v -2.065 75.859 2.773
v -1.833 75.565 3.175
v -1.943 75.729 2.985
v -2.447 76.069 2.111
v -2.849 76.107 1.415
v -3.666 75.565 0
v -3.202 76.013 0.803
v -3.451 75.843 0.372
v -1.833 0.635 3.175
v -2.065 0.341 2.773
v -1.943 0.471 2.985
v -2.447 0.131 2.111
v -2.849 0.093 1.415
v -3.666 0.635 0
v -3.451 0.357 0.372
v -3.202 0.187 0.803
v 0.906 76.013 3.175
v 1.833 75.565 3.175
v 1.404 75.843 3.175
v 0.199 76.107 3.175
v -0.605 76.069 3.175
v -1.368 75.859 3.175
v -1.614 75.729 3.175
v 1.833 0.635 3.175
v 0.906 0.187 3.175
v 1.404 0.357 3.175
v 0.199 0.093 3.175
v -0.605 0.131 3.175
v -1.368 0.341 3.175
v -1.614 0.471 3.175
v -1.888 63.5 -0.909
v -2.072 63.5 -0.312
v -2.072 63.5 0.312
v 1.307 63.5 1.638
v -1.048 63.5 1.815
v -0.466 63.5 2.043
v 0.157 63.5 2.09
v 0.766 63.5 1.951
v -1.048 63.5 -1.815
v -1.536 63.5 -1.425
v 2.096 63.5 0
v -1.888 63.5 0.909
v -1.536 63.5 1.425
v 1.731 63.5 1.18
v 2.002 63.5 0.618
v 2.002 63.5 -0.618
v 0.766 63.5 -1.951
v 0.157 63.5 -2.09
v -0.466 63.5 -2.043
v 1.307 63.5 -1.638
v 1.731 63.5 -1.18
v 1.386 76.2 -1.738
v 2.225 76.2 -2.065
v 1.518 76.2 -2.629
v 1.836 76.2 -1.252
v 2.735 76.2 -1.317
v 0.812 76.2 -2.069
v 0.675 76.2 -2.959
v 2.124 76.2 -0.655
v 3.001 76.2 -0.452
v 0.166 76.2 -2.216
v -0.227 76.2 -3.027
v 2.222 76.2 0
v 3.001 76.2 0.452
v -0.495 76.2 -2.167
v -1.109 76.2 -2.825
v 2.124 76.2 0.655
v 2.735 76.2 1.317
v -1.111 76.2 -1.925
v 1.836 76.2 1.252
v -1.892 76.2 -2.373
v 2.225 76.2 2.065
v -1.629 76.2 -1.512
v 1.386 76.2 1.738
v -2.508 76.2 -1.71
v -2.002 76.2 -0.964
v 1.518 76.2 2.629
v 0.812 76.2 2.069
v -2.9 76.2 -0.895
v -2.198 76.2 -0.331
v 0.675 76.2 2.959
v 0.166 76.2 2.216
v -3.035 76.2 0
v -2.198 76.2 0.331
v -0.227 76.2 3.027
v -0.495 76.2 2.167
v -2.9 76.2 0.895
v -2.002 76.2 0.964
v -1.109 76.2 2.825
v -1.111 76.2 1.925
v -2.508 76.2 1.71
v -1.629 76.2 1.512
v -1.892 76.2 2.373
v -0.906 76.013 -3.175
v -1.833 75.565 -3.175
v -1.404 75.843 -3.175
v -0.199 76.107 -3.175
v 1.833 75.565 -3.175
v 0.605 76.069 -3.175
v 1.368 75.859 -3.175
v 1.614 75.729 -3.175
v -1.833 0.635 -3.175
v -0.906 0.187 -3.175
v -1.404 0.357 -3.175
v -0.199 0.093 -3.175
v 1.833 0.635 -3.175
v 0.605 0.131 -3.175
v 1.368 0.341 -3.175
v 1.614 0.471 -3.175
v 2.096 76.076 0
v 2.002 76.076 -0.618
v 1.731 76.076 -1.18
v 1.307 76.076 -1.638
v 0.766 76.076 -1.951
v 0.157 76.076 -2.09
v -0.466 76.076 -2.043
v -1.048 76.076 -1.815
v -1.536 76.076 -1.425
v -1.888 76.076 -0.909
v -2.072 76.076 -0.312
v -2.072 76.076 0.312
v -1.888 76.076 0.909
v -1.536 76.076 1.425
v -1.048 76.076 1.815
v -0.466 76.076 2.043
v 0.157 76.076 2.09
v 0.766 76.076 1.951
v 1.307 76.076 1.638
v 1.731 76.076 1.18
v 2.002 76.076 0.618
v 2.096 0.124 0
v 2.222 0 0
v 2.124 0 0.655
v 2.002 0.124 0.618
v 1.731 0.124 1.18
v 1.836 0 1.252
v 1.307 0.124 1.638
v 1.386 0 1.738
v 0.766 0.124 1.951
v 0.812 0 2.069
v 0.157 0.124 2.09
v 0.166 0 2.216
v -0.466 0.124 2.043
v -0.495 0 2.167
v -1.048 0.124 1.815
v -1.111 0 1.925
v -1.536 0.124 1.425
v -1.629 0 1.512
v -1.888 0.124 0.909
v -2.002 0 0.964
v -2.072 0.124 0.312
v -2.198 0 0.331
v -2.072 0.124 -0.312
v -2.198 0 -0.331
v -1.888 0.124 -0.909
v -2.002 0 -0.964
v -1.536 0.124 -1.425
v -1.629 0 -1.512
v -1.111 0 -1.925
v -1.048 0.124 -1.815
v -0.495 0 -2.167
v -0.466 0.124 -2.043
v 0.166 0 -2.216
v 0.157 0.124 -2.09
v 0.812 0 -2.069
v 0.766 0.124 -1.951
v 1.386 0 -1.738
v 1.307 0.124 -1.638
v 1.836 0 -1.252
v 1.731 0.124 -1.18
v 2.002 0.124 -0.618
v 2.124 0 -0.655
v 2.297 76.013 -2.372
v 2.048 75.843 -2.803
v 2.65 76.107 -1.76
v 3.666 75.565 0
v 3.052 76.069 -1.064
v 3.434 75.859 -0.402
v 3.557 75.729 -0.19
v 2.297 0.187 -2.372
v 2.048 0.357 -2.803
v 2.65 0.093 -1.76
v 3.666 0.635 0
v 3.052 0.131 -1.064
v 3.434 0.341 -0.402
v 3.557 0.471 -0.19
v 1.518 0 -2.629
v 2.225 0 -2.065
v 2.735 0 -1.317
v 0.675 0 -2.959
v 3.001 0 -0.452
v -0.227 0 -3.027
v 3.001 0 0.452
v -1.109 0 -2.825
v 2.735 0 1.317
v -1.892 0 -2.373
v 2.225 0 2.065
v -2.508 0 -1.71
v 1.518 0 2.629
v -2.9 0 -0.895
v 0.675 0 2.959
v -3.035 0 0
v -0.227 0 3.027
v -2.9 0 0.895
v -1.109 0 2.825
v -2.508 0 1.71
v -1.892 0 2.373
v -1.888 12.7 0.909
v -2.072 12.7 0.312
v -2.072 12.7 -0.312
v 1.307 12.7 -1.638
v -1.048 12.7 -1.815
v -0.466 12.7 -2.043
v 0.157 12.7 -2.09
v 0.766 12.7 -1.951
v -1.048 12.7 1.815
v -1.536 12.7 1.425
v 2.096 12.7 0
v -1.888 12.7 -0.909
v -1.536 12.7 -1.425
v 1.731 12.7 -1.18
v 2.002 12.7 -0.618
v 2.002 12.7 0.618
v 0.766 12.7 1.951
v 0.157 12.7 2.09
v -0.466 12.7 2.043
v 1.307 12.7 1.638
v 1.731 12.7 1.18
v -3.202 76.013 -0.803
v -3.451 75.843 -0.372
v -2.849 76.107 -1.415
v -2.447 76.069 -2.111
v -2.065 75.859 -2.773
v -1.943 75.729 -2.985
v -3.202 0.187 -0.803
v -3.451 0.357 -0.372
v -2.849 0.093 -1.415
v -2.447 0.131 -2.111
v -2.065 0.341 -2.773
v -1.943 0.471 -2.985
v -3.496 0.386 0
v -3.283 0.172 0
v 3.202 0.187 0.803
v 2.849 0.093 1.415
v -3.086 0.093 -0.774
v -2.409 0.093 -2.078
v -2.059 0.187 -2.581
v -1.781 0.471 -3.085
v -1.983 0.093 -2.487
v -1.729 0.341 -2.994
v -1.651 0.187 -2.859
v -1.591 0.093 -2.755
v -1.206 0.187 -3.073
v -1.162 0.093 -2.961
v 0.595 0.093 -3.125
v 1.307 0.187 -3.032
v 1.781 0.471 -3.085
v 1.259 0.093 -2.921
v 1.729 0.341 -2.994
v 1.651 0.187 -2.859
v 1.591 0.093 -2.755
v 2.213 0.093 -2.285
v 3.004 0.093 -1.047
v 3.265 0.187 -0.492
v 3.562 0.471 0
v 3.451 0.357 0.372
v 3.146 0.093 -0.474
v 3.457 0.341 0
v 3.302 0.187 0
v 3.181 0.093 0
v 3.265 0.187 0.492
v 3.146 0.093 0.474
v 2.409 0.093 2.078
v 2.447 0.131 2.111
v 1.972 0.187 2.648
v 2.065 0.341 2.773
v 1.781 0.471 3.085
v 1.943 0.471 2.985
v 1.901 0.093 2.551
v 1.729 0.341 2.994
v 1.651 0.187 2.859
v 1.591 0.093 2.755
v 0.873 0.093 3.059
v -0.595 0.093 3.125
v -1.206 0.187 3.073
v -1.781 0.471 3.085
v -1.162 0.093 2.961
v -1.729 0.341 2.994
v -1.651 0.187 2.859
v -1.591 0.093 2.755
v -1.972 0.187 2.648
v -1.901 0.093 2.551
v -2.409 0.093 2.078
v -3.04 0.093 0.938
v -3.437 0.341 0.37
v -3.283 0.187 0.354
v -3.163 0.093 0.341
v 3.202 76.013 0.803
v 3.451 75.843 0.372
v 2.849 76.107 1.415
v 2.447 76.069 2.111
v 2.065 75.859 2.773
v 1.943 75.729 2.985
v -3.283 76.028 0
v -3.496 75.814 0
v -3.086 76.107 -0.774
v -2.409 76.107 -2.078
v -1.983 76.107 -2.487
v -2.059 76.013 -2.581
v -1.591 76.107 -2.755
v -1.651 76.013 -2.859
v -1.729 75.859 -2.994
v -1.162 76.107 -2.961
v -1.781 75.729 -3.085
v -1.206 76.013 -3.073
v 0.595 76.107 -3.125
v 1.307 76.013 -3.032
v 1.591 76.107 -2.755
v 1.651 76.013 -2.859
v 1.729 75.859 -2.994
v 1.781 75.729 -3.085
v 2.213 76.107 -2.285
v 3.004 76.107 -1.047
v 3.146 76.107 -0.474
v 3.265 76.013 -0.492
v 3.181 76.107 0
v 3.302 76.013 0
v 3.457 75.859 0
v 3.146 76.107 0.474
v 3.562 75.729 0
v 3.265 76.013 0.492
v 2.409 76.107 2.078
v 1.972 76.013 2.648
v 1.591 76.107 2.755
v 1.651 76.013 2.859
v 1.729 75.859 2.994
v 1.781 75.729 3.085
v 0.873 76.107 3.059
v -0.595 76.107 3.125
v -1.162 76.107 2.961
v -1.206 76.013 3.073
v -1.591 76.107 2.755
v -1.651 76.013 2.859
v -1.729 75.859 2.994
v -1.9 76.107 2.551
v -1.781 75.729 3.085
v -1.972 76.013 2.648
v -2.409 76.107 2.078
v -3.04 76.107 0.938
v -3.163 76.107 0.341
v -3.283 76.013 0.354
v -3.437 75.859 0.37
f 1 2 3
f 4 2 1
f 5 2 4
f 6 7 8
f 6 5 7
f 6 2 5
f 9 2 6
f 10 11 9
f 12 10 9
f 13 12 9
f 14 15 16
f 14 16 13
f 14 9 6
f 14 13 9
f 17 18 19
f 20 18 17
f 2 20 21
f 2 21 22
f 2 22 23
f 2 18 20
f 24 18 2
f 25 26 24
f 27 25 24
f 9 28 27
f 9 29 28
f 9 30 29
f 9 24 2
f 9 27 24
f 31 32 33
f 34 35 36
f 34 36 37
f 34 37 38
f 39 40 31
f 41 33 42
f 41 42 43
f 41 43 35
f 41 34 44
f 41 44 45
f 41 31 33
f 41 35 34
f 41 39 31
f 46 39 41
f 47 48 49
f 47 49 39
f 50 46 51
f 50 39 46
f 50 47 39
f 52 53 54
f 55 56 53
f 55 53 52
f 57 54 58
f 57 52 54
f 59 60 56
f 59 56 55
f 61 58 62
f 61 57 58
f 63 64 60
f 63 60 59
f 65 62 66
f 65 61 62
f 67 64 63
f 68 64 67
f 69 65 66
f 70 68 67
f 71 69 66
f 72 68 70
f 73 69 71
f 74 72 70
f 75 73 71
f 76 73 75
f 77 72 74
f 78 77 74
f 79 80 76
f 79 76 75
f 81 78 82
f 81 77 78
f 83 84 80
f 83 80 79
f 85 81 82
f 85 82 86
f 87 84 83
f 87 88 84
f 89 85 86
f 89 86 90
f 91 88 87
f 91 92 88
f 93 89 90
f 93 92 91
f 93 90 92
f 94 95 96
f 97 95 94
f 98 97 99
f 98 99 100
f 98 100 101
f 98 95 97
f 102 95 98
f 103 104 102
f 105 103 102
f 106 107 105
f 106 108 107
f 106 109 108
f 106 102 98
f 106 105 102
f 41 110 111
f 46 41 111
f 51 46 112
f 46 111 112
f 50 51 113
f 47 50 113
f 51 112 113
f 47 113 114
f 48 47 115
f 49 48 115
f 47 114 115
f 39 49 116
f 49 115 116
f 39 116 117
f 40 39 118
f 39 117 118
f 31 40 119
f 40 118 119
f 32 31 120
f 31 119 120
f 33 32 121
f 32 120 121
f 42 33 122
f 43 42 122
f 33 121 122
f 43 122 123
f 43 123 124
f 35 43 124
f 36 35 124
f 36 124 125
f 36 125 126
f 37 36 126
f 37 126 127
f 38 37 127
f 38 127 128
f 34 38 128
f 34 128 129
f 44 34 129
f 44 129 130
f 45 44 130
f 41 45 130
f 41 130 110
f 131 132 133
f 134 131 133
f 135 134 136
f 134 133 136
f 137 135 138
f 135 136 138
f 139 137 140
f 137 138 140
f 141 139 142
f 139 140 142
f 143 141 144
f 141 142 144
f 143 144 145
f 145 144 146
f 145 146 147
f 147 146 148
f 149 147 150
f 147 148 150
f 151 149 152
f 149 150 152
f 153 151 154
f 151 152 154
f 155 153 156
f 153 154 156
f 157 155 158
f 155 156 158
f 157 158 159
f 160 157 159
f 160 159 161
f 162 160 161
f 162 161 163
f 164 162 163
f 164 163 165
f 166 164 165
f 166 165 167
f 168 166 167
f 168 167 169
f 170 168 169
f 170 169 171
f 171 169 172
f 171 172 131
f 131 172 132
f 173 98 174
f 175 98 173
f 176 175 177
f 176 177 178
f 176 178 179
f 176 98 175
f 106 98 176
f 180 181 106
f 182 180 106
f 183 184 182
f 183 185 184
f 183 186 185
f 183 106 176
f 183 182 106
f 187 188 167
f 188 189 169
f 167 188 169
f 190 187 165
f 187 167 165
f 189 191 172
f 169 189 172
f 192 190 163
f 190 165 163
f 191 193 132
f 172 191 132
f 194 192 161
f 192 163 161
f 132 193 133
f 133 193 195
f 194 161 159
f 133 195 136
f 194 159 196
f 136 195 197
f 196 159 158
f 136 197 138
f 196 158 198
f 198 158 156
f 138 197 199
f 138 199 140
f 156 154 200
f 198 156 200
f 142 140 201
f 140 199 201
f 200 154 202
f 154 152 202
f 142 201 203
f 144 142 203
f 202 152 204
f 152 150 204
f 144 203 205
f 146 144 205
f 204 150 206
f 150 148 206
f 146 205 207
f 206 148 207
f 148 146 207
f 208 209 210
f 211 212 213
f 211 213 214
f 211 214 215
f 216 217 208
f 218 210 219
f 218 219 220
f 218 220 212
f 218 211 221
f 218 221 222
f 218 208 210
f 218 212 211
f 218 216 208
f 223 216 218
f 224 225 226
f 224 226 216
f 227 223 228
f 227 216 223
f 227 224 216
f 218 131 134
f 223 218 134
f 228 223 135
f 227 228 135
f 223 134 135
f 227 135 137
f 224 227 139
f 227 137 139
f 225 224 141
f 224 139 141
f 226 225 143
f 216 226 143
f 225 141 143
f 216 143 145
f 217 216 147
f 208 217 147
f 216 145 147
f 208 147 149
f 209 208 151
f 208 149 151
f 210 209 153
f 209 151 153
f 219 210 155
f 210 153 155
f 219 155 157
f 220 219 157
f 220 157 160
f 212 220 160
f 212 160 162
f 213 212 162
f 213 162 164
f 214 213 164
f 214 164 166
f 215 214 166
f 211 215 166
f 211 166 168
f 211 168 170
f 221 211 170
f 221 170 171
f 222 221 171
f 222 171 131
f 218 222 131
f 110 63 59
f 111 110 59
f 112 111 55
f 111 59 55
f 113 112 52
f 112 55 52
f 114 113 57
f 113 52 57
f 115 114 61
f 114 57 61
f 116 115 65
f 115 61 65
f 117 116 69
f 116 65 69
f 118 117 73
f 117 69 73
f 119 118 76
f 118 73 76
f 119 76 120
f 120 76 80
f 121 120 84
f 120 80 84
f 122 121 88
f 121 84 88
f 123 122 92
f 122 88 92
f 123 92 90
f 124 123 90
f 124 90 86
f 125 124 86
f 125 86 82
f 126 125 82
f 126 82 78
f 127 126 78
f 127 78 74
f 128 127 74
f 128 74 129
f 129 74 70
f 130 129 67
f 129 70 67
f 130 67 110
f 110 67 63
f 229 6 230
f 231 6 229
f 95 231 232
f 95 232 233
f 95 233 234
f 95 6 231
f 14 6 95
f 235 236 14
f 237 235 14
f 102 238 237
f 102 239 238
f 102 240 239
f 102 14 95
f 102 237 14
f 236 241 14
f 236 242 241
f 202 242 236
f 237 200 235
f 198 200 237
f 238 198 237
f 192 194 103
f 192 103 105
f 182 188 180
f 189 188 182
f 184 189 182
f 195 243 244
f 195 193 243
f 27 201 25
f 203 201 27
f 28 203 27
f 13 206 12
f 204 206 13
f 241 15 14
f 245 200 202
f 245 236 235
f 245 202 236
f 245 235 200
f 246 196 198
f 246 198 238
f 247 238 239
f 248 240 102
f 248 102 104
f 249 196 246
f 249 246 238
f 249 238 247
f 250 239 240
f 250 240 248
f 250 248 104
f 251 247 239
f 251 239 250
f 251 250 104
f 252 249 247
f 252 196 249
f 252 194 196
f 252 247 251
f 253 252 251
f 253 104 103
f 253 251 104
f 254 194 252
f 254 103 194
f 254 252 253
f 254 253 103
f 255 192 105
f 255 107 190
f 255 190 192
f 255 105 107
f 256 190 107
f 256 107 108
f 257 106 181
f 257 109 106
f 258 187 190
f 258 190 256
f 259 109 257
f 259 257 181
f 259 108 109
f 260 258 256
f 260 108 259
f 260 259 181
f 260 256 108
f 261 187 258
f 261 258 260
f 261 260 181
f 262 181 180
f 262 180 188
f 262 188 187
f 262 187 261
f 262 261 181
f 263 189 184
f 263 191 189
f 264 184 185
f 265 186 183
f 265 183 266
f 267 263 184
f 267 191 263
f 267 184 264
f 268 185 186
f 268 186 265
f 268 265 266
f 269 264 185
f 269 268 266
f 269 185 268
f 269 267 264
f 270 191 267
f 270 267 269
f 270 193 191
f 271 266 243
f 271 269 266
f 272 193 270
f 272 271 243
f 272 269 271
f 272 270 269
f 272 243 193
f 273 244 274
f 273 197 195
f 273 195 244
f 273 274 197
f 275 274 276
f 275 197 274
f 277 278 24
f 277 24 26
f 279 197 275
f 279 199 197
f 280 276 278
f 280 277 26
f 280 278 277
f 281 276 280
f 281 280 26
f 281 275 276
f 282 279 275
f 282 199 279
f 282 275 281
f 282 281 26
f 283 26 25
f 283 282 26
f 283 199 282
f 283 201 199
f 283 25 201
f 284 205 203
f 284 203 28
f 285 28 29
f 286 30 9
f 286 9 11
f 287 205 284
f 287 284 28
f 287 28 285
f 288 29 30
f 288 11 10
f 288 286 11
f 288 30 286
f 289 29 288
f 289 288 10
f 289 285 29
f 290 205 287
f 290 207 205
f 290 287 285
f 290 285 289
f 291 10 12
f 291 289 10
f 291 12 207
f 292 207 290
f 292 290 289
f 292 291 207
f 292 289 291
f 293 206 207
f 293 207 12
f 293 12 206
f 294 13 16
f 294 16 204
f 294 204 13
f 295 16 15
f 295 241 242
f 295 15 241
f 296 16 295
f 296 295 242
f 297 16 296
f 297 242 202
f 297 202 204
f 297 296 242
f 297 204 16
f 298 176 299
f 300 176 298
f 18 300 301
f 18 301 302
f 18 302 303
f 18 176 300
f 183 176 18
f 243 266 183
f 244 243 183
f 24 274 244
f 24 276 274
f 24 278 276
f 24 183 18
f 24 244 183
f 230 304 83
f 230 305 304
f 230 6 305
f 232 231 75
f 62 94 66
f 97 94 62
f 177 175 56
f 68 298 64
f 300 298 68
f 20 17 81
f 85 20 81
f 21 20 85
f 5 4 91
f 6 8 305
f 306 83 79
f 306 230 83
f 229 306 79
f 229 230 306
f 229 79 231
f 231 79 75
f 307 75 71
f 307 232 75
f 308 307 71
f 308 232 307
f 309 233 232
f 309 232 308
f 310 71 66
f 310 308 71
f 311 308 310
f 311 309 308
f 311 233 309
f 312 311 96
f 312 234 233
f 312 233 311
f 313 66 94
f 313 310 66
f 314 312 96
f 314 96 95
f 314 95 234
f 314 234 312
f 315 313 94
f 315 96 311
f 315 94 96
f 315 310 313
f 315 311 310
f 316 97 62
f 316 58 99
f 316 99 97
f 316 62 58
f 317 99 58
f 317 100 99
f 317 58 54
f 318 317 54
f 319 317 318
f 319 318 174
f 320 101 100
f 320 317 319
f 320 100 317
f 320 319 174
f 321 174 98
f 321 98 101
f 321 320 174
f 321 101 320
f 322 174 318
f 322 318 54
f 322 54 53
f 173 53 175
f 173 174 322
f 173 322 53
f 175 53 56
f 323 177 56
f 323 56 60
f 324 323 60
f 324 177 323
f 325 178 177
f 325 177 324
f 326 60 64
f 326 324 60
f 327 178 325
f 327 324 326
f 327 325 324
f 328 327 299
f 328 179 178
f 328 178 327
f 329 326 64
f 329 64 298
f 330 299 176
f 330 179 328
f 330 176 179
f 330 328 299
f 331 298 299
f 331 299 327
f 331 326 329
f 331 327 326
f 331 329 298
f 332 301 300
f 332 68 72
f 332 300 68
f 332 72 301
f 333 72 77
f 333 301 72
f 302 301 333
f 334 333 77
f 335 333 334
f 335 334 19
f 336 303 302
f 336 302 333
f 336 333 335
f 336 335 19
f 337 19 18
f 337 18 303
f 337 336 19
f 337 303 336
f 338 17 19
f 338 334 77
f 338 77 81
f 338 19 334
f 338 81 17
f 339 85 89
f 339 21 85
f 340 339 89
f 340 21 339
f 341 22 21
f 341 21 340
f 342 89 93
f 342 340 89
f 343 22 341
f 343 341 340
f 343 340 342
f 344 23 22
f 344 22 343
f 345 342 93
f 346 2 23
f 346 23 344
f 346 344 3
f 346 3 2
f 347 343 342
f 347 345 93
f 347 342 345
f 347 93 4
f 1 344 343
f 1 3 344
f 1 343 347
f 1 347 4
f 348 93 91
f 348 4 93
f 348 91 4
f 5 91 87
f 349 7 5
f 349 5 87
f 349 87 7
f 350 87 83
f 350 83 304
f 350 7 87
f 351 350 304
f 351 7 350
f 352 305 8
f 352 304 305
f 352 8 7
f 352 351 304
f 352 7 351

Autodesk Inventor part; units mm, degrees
ref_plane "YZ Plane" through (0, 0, 0) normal (1, 0, 0) x (0, 1, 0)
ref_plane "XZ Plane" through (0, 0, 0) normal (0, 1, 0) x (-1, 0, 0)
ref_plane "XY Plane" through (0, 0, 0) normal (0, 0, 1) x (1, 0, 0)
sketch "Sketch1" plane through (0, 0, 0) normal (0, 1, 0) x (-1, 0, 0)
  line L0 (-1.8331, -3.175) -> (-3.6662, 0)
  line L1 (-3.6662, 0) -> (-1.8331, 3.175)
  line L2 (-1.8331, 3.175) -> (1.8331, 3.175)
  line L3 (1.8331, 3.175) -> (3.6662, 0)
  line L4 (3.6662, 0) -> (1.8331, -3.175)
  line L5 (1.8331, -3.175) -> (-1.8331, -3.175)
  point P0 (0, 0)
  point P1 (0, 0)
  dimension "d0" = 6.35
extrude "Body" add sketch "Sketch1" along normal blind 76.2
sketch "Sketch2" plane through (0, 76.2, 0) normal (0, 1, 0) x (1, 0, 0)
  circle A0 centre (0, 0) radius 2.0955
  dimension "d3" = 4.191
extrude "Hole 2" cut sketch "Sketch2" against normal blind 12.7
sketch "Sketch3" plane through (0, 0, 0) normal (0, -1, 0) x (1, 0, 0)
  circle A0 centre (0, 0) radius 2.0955
  dimension "d6" = 4.191
extrude "Hole 1" cut sketch "Sketch3" against normal blind 12.7
chamfer "Hole 2 Chamfer 1" distance 0.127 distance2 0.1244 1 edges at (-2.0955, 76.2, 0) measured on face at (0.0842, 76.2, 2.8101)
chamfer "Hole 1 Chamfer 1" distance 0.127 distance2 0.1244 1 edges at (-2.0955, 0, 0) measured on face at (-0.0842, 0, 2.8101)
sketch "Sketch4" plane through (0, 0, 0) normal (0, 0, 1) x (1, 0, 0)
  line L0 (1.8331, 76.2) -> (-1.8331, 76.2) projected
  line L1 (0, 76.2) -> (-3.0353, 76.2)
  line L2 (-3.6662, 76.2) -> (-1.8331, 76.2) projected
  line L3 (-3.6662, 0) -> (-3.6662, 76.2) projected
  arc A0 (-3.0353, 76.2) -> (-3.6662, 75.565) centre (-2.2234, 74.7624) ccw
  line L4 (-3.6662, 75.565) -> (-6.3588, 78.1647)
  line L5 (-6.3588, 78.1647) -> (0, 76.2)
  line L6 (0, 76.2) -> (0, 129.864)
  point P0 (0, 0)
  dimension "d15" = 3.0353
  dimension "d16" = 1.651
  dimension "d17" = 0.635
revolve "Hole 2 Chamfer 2" cut sketch "Sketch4" angle 360 about axis through (0, 76.2, 0) along (0, 1, 0)
sketch "Sketch5" plane through (0, 0, 0) normal (0, 0, 1) x (1, 0, 0)
  line L0 (0, 0) -> (-3.0353, 0)
  line L1 (1.8331, 0) -> (-1.8331, 0) projected
  line L2 (-3.6662, 0) -> (-3.6662, 76.2) projected
  arc A0 (-3.6662, 0.635) -> (-3.0353, 0) centre (-2.2234, 1.4376) ccw
  line L3 (0, 0) -> (0, -2.1986)
  line L4 (-3.6662, 0.635) -> (-4.1154, -0.8715)
  line L5 (-4.1154, -0.8715) -> (0, 0)
  point P0 (-3.6662, 75.565)
  dimension "d19" = 3.0353
  dimension "d20" = 1.651
  dimension "d21" = 0.635
revolve "Hole 1 Chamfer 2" cut sketch "Sketch5" angle 360 about axis through (0, 0, 0) along (0, -1, 0)
chamfer "Hole 2 Chamfer 1 For Short" [suppressed]
sketch "Sketch7" plane through (0, 0, 0) normal (0, 0, 1) x (1, 0, 0)
  line L0 (0, 76.2004) -> (3.0353, 76.2)
  line L1 (3.6662, 76.2) -> (1.8331, 76.2) projected
  line L2 (3.6662, 0.635) -> (3.6662, 76.2) projected
  arc A0 (3.6662, 75.565) -> (3.0353, 76.2) centre (2.2234, 74.7624) ccw
  line L3 (3.6662, 75.565) -> (4.2663, 77.1032)
  line L4 (4.2663, 77.1032) -> (0, 76.2004)
  line L5 (0, 78.0061) -> (0, 76.2004)
  line L6 (1.8331, 76.2) -> (-1.8331, 76.2) projected
  point P0 (0, 0)
  point P1 (0, 76.2)
  dimension "d33" = 3.0353
  dimension "d34" = 1.651
  dimension "d35" = 0.635
revolve "Hole 2 Chamfer 2 For Short" [suppressed]
properties part number "Standoff .5" material "VEX Aluminum Alloy 5052-H32"
